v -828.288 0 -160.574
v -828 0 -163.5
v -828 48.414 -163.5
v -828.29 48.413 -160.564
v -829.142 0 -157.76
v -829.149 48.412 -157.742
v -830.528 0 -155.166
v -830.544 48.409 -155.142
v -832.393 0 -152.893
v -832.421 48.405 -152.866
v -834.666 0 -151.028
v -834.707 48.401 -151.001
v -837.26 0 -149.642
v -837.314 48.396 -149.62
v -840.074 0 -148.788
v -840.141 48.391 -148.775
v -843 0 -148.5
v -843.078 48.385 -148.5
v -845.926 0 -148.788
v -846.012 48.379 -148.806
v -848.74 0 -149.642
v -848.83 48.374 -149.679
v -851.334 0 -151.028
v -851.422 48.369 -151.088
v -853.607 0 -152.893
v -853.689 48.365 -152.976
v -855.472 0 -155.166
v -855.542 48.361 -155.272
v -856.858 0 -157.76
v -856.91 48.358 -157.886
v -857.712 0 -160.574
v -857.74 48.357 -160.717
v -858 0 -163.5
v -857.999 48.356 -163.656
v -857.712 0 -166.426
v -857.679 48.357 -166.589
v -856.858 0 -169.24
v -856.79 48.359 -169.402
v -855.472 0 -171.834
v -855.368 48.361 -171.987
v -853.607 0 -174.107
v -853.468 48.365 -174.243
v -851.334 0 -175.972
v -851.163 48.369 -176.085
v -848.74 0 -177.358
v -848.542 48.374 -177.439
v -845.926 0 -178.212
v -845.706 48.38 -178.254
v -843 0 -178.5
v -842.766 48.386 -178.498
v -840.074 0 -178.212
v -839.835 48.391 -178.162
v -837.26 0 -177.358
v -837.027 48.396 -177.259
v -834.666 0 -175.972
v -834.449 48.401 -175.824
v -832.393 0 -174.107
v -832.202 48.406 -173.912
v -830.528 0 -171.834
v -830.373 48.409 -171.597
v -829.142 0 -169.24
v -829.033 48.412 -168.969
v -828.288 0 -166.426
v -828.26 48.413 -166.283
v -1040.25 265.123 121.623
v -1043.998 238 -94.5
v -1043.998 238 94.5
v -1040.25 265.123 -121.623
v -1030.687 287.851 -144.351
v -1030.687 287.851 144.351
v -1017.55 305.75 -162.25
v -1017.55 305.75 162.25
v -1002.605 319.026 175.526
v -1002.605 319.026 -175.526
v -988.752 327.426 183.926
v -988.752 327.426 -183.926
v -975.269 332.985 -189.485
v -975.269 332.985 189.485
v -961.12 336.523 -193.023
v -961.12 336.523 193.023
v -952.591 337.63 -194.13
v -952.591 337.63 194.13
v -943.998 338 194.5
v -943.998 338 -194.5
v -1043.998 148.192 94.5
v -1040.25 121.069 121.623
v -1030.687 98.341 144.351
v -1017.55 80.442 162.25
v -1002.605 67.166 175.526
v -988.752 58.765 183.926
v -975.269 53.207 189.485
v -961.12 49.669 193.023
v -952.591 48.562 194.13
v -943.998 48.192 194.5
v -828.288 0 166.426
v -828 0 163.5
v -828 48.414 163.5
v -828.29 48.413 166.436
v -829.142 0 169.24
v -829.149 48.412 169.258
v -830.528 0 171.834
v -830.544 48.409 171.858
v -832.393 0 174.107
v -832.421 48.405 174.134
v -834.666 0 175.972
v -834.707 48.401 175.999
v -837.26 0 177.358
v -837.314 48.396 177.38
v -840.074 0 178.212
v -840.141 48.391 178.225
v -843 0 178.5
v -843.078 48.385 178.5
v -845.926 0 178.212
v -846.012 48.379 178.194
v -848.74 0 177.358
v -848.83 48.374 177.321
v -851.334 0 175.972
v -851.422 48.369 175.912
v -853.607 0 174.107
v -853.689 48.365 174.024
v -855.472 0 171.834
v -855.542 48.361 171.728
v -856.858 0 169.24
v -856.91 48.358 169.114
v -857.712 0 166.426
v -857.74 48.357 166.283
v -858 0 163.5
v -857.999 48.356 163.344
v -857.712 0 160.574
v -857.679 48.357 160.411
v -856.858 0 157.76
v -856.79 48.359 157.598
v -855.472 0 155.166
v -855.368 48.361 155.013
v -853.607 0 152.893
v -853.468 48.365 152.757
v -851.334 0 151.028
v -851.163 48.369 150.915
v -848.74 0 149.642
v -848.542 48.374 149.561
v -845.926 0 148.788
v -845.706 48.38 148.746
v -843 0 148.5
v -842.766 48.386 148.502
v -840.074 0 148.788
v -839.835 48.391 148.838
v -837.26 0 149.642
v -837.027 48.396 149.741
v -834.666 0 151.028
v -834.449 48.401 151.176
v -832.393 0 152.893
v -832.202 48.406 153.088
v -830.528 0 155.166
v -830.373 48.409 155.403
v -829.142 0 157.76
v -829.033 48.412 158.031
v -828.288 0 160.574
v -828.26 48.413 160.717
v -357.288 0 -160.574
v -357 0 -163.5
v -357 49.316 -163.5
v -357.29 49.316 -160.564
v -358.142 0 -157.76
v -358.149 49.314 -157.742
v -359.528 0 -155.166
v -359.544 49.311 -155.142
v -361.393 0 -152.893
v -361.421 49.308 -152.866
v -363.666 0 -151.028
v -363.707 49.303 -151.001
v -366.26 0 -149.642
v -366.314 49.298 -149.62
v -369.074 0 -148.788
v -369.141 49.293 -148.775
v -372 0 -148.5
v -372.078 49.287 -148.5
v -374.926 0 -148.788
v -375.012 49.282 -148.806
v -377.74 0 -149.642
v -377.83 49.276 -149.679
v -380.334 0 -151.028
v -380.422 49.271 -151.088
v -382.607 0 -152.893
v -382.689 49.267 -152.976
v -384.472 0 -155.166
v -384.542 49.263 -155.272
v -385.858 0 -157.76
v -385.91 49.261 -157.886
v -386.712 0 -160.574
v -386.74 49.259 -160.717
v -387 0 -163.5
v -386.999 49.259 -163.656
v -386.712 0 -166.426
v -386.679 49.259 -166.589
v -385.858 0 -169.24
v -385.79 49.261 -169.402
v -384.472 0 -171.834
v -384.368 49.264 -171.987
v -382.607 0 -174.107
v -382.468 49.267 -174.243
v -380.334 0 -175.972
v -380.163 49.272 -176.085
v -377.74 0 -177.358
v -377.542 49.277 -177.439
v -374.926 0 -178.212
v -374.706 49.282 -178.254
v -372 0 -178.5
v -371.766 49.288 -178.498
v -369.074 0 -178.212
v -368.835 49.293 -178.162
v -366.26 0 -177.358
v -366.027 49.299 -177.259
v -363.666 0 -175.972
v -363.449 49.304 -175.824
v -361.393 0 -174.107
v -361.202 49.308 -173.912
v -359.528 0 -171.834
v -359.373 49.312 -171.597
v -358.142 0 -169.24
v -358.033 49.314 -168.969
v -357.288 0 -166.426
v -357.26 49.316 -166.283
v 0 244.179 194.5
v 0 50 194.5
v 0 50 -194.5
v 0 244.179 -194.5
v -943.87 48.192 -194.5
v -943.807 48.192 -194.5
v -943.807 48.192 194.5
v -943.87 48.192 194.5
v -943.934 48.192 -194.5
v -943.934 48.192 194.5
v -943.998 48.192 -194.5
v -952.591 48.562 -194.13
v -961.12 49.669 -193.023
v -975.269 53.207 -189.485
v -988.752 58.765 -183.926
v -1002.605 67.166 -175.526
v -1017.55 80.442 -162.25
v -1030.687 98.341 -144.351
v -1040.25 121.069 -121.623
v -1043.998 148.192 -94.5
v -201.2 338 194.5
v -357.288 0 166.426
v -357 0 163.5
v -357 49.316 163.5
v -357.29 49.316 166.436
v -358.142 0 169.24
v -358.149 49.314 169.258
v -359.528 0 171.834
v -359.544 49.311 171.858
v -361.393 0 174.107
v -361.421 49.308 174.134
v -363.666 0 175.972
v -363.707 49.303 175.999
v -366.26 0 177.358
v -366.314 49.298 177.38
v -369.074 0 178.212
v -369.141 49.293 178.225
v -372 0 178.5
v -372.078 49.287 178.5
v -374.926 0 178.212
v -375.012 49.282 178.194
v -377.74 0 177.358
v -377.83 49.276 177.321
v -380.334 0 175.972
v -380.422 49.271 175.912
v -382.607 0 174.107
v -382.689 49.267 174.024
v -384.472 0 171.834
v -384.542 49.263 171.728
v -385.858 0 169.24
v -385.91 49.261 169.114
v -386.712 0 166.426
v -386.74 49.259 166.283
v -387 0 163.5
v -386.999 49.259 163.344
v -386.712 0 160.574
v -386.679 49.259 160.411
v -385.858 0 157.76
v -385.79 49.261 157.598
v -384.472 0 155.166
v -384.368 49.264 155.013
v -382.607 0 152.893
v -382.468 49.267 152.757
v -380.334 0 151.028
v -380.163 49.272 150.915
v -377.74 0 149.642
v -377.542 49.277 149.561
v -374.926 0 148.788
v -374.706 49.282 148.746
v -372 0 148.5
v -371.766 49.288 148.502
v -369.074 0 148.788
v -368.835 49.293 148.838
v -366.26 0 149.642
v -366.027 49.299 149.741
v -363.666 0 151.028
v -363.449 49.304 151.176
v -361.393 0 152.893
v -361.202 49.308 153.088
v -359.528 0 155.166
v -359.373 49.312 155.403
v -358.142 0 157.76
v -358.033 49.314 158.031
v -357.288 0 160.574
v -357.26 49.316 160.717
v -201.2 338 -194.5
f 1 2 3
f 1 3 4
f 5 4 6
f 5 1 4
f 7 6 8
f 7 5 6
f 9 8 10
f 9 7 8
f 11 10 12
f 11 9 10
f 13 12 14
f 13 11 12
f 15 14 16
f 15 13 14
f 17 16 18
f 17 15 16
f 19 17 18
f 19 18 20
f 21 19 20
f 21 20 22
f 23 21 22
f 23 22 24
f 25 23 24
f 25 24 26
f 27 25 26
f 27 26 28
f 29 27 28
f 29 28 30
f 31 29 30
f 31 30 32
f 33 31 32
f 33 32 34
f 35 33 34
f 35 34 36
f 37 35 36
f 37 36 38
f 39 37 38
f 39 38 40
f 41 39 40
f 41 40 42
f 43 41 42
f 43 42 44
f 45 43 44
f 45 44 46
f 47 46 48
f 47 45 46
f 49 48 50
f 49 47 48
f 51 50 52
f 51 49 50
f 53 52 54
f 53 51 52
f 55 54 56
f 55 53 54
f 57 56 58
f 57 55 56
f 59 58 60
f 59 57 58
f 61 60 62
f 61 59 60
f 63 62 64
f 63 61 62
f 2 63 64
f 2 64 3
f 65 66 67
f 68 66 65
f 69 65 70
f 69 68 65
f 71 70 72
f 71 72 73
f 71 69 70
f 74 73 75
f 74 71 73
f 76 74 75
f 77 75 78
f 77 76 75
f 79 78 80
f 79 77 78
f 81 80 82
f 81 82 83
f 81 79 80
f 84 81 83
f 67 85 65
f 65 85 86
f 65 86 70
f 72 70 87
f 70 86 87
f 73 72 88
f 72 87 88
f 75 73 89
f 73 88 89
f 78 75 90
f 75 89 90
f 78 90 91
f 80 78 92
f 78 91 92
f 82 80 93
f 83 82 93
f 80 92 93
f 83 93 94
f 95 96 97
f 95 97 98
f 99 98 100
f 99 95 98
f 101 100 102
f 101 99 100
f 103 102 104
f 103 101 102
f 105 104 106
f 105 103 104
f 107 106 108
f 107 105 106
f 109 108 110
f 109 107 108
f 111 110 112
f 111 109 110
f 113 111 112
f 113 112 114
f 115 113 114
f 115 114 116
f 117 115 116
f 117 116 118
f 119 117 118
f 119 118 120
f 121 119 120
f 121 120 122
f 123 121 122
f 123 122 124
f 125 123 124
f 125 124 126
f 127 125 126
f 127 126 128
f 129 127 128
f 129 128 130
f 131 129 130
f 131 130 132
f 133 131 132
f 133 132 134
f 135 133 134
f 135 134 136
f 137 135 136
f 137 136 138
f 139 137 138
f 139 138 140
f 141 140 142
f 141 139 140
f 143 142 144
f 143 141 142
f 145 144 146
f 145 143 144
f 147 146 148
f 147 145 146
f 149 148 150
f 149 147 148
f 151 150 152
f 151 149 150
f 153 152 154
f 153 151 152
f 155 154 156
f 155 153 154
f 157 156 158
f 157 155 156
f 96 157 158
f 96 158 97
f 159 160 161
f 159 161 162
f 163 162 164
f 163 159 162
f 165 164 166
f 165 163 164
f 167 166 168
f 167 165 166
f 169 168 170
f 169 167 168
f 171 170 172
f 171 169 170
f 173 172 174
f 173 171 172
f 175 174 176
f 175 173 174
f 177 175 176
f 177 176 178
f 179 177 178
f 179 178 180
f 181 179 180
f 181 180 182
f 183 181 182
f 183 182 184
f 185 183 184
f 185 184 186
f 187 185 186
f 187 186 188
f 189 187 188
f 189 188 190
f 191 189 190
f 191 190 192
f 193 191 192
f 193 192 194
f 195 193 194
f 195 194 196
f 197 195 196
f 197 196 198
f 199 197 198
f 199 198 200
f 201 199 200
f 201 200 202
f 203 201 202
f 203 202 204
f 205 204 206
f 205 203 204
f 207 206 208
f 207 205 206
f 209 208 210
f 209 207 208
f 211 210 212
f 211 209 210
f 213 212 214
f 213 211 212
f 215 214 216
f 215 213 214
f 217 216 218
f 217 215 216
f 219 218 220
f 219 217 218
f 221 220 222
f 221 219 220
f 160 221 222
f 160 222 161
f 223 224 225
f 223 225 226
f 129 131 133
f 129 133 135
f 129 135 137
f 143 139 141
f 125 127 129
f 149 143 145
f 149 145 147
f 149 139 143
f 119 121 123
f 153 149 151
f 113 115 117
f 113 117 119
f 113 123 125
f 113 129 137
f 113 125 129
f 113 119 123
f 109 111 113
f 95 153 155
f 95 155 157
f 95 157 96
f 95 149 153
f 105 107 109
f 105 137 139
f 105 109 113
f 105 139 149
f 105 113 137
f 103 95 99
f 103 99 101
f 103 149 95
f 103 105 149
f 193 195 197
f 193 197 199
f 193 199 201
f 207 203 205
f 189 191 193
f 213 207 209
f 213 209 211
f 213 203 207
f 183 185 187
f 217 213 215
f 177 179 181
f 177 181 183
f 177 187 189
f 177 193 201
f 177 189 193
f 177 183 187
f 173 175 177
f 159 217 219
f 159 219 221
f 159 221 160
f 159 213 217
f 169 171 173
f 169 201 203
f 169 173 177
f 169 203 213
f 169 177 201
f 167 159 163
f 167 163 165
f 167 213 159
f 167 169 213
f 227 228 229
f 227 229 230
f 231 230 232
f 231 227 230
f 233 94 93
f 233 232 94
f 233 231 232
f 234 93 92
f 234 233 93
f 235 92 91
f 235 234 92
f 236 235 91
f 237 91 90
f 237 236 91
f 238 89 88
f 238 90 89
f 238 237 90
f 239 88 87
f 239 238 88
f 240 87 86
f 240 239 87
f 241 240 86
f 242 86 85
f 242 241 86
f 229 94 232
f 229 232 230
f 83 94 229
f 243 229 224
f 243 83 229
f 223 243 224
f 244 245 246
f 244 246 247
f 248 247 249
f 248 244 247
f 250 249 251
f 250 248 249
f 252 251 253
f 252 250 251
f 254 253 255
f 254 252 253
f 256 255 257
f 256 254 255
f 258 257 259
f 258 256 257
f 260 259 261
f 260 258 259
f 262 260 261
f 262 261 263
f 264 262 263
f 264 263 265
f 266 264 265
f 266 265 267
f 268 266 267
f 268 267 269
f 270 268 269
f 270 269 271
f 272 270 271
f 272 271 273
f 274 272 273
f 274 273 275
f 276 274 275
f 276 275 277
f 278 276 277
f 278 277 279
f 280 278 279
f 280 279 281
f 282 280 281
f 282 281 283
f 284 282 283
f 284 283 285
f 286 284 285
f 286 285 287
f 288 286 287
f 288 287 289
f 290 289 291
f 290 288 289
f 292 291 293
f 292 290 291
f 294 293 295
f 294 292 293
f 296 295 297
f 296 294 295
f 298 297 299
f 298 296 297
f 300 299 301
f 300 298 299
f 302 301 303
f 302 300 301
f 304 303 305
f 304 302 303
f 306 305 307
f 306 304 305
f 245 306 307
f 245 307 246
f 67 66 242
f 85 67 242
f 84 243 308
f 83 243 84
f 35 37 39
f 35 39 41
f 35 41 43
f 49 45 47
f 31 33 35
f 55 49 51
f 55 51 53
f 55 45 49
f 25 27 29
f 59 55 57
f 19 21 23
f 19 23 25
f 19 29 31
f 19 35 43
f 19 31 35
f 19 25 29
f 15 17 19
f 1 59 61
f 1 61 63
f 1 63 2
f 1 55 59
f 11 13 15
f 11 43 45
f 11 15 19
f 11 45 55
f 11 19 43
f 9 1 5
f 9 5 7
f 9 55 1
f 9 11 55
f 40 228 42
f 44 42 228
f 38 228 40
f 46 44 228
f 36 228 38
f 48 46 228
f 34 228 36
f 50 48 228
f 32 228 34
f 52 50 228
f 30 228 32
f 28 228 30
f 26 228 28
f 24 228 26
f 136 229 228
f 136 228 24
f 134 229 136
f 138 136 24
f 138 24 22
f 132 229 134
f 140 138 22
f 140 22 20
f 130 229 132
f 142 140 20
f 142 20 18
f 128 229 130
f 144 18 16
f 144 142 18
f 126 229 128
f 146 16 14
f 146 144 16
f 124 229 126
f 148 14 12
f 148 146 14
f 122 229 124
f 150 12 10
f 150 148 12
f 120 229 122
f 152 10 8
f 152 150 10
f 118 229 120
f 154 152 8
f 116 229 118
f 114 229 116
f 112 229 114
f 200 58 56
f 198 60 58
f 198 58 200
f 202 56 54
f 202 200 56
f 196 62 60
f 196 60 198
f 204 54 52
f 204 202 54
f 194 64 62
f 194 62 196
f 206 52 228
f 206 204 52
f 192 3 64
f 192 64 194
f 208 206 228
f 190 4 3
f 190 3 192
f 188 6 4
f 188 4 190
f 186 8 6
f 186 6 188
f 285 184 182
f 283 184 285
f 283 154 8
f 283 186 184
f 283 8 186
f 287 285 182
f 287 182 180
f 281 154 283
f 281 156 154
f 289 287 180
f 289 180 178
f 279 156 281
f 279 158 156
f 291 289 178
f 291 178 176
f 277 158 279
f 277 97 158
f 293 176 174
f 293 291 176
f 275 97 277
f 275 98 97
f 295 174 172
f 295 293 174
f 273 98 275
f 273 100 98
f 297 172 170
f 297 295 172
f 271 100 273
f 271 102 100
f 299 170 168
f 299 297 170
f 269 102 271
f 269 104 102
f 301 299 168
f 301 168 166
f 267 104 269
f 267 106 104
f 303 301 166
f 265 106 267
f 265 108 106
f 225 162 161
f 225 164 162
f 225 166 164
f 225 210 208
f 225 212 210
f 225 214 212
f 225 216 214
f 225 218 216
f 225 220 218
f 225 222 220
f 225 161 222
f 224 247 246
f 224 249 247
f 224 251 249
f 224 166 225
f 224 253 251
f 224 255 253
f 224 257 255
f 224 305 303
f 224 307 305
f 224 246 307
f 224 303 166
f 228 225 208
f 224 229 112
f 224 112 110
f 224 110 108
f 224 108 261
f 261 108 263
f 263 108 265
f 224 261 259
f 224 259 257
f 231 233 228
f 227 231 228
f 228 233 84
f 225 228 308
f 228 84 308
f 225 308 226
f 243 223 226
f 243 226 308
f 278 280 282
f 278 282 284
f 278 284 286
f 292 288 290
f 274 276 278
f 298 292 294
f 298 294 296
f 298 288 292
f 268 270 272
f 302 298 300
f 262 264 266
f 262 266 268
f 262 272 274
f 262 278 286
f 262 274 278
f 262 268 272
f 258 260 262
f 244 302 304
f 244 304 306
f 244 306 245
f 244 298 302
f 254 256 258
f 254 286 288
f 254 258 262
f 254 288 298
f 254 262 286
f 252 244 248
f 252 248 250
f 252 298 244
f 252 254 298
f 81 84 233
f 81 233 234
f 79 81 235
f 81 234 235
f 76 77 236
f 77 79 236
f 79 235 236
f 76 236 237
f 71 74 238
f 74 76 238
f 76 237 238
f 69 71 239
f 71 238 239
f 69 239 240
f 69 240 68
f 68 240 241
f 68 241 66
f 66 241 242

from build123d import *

# Parameters (mm, degrees)
F1_DEPTH = 194.5
F2_DEPTH = 194.5
F3_R     = 15
F5_R     = 100


with BuildPart() as f1:
    # F0 (on Top) → F1 (new body)
    with BuildSketch(Plane.XY):
        Polygon((-1043.9980842894, 48), (0, 50), (0, 244.1787458936), (-201.2003287221, 338), (-1043.9980842894, 338), (-1043.9980842894, 50), align=None)
    extrude(amount=F1_DEPTH)

    # F0 (on Top) → F2 (join)
    with BuildSketch(Plane.XY):
        Polygon((-1043.9980842894, 48), (0, 50), (0, 244.1787458936), (-201.2003287221, 338), (-1043.9980842894, 338), (-1043.9980842894, 50), align=None)
    extrude(amount=-F2_DEPTH)

    # F3 (on Front) → F4 (join, up to the next surface of F1)
    with BuildSketch(Plane.XZ):
        with Locations((-843, 163.5)):
            Circle(F3_R)
        with Locations((-843, -163.5)):
            Circle(F3_R)
        with Locations((-372, 163.5)):
            Circle(F3_R)
        with Locations((-372, -163.5)):
            Circle(F3_R)
    extrude(until=Until.NEXT, dir=(0, 1, 0))

    # F5
    f5_edges = [f1.edges().sort_by_distance(p)[0] for p in [
        (-1043.998084, 338, 0),
        (-1043.998084, 193, 194.5),
        (-1043.998084, 48, 0),
        (-1043.998084, 193, -194.5),
    ]]
    fillet(f5_edges, radius=F5_R)


solid = f1.part
